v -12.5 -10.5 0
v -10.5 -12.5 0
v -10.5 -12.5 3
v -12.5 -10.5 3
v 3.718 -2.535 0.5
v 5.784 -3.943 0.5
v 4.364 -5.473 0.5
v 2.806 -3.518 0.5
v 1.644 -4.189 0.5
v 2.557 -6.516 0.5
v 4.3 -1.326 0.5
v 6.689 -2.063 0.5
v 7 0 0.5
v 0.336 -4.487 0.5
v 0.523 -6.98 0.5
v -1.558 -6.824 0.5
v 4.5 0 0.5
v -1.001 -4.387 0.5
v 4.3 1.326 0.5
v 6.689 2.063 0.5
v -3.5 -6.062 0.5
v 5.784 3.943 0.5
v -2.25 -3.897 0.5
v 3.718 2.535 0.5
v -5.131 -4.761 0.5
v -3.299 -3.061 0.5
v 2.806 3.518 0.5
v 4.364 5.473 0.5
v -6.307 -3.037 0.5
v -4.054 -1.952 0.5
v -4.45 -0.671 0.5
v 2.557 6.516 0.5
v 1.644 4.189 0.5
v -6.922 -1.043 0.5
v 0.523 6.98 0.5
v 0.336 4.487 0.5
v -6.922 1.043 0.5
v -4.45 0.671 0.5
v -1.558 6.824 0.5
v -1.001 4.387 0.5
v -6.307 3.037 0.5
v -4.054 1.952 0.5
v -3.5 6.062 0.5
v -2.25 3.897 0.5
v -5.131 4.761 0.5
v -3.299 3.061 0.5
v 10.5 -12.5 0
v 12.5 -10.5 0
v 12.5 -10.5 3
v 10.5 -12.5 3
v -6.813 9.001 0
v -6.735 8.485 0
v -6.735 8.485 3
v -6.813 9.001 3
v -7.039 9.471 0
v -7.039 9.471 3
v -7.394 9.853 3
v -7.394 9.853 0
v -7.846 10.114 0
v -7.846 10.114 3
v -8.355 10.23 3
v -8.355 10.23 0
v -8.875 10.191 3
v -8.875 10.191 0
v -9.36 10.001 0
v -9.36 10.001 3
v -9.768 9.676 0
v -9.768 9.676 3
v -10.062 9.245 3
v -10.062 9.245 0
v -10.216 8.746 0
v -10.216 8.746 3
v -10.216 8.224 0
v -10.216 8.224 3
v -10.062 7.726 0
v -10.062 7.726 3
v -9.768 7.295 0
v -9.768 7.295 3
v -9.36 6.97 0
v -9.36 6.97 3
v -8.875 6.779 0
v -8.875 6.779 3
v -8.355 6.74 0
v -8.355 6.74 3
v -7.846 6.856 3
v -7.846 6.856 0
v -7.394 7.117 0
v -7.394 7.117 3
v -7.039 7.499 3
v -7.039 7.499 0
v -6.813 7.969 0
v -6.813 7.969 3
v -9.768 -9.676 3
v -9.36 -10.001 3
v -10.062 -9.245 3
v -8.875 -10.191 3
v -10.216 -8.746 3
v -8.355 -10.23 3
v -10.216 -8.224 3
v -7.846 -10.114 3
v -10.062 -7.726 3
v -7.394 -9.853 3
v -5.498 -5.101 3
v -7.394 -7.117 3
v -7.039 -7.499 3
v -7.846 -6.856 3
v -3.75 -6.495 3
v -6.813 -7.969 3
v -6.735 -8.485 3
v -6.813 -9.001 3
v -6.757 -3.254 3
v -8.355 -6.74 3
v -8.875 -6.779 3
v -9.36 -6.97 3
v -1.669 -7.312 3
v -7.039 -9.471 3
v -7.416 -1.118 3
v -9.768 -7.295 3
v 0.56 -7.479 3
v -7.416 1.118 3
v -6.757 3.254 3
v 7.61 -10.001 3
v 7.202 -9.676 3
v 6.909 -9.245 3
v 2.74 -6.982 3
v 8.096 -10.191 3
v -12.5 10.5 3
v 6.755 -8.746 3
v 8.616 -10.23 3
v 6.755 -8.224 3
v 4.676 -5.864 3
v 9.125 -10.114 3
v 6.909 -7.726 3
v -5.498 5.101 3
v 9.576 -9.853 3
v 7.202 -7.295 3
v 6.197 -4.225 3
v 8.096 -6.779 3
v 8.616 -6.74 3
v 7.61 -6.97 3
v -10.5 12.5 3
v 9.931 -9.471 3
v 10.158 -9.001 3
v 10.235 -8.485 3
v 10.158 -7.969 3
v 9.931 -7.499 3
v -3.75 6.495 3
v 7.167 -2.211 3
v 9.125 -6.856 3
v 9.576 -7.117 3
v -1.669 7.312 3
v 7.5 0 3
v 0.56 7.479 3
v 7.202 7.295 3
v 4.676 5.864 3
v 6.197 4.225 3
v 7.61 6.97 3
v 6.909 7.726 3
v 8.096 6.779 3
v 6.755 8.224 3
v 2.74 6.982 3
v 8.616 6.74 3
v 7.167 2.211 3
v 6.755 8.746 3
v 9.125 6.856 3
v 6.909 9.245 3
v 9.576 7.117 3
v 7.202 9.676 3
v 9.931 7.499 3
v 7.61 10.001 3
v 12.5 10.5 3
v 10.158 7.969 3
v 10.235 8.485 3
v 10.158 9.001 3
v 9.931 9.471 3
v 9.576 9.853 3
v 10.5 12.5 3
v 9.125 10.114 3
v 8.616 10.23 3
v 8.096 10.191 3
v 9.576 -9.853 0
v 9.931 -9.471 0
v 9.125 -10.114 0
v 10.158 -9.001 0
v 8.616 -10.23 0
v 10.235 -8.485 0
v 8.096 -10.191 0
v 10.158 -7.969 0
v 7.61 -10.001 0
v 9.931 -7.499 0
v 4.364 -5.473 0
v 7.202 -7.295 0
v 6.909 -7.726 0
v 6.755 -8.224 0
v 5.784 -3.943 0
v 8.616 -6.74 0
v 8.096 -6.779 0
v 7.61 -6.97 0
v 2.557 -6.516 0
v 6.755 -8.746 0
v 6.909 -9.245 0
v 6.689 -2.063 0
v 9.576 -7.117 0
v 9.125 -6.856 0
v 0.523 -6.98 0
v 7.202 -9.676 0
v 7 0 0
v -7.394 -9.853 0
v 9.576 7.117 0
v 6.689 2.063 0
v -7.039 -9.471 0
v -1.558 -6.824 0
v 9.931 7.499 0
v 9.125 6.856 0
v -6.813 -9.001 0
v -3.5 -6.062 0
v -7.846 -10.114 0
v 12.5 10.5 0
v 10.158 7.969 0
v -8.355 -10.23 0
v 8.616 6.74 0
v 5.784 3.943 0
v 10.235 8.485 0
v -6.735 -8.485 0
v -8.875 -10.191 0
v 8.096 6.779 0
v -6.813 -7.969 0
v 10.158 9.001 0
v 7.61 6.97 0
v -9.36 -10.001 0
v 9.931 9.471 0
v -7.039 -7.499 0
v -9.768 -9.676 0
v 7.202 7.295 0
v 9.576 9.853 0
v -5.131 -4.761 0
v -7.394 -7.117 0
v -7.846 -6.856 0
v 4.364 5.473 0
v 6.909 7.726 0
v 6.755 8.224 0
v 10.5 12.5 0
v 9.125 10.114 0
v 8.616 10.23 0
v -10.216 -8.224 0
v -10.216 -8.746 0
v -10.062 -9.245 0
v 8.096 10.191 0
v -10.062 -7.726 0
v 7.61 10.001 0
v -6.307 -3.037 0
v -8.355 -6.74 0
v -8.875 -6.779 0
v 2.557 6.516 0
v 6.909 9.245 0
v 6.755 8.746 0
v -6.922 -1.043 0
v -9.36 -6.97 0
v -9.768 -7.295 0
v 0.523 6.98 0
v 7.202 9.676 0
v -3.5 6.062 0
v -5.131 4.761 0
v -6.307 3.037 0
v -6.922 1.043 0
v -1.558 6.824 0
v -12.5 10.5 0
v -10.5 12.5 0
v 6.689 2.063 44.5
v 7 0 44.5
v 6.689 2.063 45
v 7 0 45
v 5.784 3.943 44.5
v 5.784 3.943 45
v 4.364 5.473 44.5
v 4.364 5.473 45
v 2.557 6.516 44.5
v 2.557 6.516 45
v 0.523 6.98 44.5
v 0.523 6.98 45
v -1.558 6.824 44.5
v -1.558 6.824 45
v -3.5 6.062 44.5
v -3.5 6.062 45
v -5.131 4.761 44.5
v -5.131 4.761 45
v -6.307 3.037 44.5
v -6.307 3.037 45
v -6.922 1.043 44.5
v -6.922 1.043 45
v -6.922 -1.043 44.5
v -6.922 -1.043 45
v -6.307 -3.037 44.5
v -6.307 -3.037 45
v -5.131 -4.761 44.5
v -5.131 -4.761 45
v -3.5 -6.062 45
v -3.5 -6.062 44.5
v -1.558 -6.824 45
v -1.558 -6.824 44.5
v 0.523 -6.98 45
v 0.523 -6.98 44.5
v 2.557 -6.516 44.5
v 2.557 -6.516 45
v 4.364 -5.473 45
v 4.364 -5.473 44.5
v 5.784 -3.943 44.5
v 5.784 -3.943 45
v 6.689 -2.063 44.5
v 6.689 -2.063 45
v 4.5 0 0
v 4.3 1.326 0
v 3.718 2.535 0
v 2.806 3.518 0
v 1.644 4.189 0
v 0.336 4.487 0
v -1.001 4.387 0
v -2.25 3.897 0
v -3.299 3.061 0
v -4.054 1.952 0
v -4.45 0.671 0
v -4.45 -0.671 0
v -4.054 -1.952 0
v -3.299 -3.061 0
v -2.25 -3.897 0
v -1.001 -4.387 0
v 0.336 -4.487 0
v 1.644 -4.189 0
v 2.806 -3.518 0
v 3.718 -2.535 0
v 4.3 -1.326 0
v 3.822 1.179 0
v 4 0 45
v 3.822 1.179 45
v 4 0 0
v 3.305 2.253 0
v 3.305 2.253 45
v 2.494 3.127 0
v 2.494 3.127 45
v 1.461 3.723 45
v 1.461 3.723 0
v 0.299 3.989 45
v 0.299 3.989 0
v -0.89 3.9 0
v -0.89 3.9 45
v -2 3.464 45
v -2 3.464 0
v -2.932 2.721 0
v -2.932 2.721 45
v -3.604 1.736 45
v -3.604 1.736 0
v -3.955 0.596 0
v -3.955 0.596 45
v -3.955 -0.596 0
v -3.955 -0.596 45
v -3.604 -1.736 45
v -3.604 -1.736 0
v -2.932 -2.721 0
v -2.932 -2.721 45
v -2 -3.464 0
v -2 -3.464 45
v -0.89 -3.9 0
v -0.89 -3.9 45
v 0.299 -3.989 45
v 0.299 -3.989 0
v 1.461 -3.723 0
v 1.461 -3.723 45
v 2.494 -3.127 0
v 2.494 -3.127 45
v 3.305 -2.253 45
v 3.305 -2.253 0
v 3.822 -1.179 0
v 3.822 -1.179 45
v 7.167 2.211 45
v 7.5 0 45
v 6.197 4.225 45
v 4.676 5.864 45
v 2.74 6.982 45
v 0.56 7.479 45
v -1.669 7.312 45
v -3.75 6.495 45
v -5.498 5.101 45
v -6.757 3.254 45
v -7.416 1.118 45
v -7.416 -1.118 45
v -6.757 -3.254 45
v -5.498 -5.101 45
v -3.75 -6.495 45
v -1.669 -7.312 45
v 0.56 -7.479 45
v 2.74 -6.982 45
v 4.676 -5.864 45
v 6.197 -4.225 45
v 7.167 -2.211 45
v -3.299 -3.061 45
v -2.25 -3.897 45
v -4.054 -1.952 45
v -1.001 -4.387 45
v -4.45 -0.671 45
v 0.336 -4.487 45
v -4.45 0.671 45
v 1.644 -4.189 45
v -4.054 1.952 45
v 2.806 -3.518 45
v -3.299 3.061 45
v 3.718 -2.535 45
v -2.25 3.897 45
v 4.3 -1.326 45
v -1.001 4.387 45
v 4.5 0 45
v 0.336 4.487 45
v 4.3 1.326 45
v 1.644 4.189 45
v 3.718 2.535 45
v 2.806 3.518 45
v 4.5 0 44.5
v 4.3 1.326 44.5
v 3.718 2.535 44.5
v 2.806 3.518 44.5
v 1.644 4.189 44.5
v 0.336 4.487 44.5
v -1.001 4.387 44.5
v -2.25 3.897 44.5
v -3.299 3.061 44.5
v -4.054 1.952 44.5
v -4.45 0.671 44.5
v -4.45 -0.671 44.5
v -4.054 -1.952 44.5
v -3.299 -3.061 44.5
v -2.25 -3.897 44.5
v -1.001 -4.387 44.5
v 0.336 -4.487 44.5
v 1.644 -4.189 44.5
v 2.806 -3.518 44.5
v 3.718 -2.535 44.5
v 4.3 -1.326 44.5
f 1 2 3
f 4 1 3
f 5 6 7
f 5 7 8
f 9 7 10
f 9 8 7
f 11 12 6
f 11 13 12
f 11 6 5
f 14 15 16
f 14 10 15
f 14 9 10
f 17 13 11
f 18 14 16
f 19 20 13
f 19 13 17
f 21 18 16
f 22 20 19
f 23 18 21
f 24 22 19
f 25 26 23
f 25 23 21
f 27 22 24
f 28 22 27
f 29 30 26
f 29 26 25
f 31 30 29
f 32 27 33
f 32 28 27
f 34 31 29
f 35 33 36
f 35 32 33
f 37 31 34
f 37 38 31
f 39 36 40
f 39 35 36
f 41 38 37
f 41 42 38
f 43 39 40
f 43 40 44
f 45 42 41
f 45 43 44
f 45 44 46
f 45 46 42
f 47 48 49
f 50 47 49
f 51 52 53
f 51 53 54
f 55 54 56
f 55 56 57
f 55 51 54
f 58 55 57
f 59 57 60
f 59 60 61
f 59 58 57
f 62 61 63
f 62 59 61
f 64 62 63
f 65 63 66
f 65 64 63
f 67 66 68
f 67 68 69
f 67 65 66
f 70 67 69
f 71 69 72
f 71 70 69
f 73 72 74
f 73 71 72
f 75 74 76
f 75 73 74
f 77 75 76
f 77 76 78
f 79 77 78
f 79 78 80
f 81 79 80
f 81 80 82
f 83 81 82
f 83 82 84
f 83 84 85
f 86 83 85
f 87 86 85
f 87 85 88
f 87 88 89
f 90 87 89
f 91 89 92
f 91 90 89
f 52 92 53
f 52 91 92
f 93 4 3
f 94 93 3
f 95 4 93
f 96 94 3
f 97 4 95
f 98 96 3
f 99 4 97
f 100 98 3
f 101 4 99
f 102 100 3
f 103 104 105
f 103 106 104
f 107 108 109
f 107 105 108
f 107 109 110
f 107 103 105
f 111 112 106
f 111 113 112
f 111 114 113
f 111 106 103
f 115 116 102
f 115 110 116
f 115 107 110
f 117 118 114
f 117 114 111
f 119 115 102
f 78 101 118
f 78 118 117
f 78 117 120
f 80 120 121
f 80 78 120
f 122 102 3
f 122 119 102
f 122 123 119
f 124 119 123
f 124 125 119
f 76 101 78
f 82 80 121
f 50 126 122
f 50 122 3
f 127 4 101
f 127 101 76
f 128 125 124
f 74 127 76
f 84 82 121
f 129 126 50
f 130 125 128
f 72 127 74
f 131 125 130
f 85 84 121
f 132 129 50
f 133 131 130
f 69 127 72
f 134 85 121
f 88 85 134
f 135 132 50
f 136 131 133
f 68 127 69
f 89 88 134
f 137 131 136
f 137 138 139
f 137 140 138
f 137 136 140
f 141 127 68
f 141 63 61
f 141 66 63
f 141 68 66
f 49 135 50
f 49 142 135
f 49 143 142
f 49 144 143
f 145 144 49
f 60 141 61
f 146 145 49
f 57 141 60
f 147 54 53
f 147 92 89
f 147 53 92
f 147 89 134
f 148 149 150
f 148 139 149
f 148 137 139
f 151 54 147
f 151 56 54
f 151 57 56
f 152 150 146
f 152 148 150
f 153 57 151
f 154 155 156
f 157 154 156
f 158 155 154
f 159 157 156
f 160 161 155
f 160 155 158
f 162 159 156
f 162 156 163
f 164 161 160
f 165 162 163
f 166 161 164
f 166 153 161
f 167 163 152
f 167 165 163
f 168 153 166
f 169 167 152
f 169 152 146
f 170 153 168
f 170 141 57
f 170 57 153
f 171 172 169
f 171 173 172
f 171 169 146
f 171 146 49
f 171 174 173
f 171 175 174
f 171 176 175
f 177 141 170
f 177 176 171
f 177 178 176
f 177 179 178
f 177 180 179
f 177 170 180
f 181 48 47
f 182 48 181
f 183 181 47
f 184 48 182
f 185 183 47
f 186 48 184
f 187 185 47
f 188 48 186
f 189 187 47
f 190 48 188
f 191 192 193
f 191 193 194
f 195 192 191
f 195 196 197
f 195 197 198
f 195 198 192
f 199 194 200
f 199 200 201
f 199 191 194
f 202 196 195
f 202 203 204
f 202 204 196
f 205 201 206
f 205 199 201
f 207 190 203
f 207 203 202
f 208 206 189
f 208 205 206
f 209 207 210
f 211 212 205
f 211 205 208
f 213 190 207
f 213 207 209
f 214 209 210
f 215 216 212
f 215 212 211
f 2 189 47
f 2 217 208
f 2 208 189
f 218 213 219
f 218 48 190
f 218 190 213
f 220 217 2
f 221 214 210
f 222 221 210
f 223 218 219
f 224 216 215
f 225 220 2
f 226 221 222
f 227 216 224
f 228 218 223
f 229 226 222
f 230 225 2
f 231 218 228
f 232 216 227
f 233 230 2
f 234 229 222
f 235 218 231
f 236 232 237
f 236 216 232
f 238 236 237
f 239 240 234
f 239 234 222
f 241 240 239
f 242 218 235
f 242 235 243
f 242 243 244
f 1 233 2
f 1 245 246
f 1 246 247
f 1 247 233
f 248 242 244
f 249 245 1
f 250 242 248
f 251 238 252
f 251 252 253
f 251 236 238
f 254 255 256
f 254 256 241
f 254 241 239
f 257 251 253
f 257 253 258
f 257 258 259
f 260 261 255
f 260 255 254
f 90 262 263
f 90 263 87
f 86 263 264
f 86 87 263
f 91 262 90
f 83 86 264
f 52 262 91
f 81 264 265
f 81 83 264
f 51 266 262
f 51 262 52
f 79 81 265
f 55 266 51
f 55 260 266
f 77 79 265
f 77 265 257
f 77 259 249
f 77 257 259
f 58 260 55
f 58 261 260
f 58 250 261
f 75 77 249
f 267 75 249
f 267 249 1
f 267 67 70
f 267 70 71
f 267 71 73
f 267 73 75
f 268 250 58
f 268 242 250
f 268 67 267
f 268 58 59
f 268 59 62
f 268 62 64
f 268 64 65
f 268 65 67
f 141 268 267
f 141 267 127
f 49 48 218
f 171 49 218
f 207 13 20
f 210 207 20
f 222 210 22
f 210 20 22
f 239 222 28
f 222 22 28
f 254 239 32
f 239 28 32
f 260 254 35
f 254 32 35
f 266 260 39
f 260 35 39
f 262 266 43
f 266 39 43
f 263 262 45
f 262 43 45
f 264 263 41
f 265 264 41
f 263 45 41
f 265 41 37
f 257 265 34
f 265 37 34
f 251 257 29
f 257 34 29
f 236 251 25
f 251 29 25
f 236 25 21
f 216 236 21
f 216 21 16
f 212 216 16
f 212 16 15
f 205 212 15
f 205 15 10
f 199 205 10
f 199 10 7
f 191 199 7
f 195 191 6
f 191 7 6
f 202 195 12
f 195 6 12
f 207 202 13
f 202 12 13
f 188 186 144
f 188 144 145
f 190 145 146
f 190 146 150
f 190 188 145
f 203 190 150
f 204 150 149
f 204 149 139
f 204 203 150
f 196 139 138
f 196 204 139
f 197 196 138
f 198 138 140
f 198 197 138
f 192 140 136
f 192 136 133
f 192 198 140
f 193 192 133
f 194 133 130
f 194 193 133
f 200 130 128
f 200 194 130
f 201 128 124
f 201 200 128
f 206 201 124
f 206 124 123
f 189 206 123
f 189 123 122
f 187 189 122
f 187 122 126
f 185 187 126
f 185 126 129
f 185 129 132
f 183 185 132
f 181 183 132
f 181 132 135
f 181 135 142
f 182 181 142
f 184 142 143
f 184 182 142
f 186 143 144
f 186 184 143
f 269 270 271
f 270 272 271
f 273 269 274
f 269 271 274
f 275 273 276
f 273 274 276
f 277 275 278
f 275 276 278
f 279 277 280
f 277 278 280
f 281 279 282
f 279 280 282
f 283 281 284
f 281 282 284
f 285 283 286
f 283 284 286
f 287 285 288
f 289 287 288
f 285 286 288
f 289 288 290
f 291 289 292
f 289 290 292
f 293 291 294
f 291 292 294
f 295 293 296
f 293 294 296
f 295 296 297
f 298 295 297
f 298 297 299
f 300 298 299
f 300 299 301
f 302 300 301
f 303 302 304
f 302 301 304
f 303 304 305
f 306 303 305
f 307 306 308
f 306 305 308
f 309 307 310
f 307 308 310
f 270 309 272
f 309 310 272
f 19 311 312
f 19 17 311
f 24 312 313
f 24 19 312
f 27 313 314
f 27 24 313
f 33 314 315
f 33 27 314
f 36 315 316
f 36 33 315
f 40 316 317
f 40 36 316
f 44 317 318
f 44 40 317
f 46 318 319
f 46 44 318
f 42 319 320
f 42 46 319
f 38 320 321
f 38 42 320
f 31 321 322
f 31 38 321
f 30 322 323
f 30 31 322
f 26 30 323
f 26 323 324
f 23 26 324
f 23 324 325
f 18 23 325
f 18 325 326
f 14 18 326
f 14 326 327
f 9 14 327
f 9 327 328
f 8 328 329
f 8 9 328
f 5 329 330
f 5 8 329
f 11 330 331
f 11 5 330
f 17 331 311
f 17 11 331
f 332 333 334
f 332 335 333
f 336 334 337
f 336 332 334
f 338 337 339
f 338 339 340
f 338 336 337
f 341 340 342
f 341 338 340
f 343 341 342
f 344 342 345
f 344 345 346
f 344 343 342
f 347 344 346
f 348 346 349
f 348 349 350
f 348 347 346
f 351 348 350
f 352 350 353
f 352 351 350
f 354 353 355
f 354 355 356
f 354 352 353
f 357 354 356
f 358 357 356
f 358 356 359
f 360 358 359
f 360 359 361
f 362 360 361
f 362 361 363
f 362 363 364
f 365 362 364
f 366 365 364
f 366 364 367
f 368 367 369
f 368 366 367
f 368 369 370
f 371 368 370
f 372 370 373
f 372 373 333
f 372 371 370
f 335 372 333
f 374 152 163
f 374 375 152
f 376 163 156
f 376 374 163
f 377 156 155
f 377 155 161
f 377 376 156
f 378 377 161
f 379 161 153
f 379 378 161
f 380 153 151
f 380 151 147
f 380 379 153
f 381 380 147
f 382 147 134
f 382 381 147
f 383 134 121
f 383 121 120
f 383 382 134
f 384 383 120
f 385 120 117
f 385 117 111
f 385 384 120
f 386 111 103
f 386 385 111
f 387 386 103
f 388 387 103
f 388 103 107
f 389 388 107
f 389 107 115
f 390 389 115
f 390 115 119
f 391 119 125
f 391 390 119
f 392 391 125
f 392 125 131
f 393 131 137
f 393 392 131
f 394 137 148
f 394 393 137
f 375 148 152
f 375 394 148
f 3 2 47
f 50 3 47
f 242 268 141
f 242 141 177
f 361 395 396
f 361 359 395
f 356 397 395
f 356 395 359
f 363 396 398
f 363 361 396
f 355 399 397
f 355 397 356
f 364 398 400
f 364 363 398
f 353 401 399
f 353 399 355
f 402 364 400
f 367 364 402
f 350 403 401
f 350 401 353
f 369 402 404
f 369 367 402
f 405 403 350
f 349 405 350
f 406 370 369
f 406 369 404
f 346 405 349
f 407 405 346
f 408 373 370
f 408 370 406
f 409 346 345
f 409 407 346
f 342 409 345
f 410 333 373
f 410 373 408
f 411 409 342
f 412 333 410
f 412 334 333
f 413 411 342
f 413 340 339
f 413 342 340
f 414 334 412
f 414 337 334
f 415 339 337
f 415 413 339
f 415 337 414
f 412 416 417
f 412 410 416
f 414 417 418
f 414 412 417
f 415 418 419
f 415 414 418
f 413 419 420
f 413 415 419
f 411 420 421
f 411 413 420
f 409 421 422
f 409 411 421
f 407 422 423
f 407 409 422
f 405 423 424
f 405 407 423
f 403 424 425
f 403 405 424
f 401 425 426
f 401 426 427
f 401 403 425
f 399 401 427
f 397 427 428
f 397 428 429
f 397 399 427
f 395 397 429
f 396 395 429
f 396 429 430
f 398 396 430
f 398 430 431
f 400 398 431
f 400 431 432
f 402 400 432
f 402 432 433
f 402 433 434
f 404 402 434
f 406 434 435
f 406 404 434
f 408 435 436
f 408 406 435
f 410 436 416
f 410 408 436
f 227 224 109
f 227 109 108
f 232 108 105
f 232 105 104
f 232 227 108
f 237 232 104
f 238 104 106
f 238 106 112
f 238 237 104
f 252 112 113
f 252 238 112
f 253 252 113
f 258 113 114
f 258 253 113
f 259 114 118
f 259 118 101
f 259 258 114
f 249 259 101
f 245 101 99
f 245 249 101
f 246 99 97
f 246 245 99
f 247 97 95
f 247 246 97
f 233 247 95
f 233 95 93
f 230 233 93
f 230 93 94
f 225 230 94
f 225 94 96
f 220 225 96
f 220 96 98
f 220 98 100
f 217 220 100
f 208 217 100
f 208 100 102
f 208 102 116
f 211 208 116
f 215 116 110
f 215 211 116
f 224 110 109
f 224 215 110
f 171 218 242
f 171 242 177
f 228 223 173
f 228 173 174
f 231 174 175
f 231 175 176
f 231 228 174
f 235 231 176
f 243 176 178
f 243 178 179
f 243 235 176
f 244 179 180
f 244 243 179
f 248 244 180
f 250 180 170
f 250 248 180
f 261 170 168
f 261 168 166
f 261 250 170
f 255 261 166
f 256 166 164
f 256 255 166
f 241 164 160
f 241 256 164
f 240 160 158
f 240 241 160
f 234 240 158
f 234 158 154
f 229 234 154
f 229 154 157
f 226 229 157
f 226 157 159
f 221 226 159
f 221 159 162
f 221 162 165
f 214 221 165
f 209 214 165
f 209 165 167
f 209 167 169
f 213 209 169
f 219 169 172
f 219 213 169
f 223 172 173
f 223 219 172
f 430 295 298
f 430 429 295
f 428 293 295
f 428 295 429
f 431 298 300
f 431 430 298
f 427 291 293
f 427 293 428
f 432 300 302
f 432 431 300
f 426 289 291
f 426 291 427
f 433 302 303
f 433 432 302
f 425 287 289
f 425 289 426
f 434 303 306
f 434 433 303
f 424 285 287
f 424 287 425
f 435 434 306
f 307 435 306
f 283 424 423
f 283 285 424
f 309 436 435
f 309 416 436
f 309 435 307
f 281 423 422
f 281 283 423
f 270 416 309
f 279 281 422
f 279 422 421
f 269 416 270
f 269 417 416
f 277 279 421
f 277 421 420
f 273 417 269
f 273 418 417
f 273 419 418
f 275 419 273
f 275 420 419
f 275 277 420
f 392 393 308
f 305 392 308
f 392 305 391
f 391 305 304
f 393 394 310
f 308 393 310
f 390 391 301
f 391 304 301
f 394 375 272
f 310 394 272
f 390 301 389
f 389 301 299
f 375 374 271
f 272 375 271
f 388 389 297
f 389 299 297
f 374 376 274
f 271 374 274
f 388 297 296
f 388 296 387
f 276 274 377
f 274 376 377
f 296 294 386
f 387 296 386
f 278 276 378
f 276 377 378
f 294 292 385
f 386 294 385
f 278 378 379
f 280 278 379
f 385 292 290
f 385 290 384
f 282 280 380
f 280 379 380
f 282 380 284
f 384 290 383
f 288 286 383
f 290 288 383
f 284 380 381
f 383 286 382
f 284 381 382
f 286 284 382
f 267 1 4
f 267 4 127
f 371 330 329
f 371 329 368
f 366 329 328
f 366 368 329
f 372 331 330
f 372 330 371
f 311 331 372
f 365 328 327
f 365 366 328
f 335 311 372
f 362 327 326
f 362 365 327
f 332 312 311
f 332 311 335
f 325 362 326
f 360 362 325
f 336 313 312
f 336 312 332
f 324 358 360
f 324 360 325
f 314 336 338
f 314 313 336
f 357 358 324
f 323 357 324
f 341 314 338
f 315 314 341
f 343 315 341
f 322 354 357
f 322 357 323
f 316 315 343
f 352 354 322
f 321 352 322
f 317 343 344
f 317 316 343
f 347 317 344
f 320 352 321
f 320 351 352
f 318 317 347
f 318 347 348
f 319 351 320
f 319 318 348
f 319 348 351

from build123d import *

# Parameters (mm, degrees)
SKETCH_W     = 25
SKETCH_H     = 25
SKETCH_R     = 7.5
SKETCH_R_2   = 1.75
PAD_DEPTH    = 3
SKETCH002_W  = 0.5
SKETCH002_H  = 45
CHAMFER_SIZE = 2


with BuildPart() as part:
    # Sketch → Pad (new body)
    with BuildSketch(Plane.XY):
        Rectangle(SKETCH_W, SKETCH_H)
        Circle(SKETCH_R, mode=Mode.SUBTRACT)
        with Locations((8.485281, 8.485281)):
            Circle(SKETCH_R_2, mode=Mode.SUBTRACT)
        with Locations((-8.485281, 8.485281)):
            Circle(SKETCH_R_2, mode=Mode.SUBTRACT)
        with Locations((8.485281, -8.485281)):
            Circle(SKETCH_R_2, mode=Mode.SUBTRACT)
        with Locations((-8.485281, -8.485281)):
            Circle(SKETCH_R_2, mode=Mode.SUBTRACT)
    extrude(amount=PAD_DEPTH)

    # Sketch001 → Revolution (revolve)
    with BuildSketch(Plane.XZ):
        Polygon((4, 45), (4, 0), (4.5, 0), (4.5, 0.5), (7, 0.5), (7, 44.5), (4.5, 44.5), (4.5, 45), align=None)
    revolve(axis=Axis((0, 0, 0), (0, 0, 1)))

    # Sketch002 → Revolution001 (revolve)
    with BuildSketch(Plane.XZ):
        with Locations((7.25, 22.5)):
            Rectangle(SKETCH002_W, SKETCH002_H)
    revolve(axis=Axis((0, 0, 0), (0, 0, 1)))

    # Chamfer
    chamfer_edges = [part.edges().sort_by_distance(p)[0] for p in [
        (-12.5, -12.5, 1.5),
        (-12.5, 12.5, 1.5),
        (12.5, 12.5, 1.5),
        (12.5, -12.5, 1.5),
    ]]
    chamfer(chamfer_edges, length=CHAMFER_SIZE)


solid = part.part
